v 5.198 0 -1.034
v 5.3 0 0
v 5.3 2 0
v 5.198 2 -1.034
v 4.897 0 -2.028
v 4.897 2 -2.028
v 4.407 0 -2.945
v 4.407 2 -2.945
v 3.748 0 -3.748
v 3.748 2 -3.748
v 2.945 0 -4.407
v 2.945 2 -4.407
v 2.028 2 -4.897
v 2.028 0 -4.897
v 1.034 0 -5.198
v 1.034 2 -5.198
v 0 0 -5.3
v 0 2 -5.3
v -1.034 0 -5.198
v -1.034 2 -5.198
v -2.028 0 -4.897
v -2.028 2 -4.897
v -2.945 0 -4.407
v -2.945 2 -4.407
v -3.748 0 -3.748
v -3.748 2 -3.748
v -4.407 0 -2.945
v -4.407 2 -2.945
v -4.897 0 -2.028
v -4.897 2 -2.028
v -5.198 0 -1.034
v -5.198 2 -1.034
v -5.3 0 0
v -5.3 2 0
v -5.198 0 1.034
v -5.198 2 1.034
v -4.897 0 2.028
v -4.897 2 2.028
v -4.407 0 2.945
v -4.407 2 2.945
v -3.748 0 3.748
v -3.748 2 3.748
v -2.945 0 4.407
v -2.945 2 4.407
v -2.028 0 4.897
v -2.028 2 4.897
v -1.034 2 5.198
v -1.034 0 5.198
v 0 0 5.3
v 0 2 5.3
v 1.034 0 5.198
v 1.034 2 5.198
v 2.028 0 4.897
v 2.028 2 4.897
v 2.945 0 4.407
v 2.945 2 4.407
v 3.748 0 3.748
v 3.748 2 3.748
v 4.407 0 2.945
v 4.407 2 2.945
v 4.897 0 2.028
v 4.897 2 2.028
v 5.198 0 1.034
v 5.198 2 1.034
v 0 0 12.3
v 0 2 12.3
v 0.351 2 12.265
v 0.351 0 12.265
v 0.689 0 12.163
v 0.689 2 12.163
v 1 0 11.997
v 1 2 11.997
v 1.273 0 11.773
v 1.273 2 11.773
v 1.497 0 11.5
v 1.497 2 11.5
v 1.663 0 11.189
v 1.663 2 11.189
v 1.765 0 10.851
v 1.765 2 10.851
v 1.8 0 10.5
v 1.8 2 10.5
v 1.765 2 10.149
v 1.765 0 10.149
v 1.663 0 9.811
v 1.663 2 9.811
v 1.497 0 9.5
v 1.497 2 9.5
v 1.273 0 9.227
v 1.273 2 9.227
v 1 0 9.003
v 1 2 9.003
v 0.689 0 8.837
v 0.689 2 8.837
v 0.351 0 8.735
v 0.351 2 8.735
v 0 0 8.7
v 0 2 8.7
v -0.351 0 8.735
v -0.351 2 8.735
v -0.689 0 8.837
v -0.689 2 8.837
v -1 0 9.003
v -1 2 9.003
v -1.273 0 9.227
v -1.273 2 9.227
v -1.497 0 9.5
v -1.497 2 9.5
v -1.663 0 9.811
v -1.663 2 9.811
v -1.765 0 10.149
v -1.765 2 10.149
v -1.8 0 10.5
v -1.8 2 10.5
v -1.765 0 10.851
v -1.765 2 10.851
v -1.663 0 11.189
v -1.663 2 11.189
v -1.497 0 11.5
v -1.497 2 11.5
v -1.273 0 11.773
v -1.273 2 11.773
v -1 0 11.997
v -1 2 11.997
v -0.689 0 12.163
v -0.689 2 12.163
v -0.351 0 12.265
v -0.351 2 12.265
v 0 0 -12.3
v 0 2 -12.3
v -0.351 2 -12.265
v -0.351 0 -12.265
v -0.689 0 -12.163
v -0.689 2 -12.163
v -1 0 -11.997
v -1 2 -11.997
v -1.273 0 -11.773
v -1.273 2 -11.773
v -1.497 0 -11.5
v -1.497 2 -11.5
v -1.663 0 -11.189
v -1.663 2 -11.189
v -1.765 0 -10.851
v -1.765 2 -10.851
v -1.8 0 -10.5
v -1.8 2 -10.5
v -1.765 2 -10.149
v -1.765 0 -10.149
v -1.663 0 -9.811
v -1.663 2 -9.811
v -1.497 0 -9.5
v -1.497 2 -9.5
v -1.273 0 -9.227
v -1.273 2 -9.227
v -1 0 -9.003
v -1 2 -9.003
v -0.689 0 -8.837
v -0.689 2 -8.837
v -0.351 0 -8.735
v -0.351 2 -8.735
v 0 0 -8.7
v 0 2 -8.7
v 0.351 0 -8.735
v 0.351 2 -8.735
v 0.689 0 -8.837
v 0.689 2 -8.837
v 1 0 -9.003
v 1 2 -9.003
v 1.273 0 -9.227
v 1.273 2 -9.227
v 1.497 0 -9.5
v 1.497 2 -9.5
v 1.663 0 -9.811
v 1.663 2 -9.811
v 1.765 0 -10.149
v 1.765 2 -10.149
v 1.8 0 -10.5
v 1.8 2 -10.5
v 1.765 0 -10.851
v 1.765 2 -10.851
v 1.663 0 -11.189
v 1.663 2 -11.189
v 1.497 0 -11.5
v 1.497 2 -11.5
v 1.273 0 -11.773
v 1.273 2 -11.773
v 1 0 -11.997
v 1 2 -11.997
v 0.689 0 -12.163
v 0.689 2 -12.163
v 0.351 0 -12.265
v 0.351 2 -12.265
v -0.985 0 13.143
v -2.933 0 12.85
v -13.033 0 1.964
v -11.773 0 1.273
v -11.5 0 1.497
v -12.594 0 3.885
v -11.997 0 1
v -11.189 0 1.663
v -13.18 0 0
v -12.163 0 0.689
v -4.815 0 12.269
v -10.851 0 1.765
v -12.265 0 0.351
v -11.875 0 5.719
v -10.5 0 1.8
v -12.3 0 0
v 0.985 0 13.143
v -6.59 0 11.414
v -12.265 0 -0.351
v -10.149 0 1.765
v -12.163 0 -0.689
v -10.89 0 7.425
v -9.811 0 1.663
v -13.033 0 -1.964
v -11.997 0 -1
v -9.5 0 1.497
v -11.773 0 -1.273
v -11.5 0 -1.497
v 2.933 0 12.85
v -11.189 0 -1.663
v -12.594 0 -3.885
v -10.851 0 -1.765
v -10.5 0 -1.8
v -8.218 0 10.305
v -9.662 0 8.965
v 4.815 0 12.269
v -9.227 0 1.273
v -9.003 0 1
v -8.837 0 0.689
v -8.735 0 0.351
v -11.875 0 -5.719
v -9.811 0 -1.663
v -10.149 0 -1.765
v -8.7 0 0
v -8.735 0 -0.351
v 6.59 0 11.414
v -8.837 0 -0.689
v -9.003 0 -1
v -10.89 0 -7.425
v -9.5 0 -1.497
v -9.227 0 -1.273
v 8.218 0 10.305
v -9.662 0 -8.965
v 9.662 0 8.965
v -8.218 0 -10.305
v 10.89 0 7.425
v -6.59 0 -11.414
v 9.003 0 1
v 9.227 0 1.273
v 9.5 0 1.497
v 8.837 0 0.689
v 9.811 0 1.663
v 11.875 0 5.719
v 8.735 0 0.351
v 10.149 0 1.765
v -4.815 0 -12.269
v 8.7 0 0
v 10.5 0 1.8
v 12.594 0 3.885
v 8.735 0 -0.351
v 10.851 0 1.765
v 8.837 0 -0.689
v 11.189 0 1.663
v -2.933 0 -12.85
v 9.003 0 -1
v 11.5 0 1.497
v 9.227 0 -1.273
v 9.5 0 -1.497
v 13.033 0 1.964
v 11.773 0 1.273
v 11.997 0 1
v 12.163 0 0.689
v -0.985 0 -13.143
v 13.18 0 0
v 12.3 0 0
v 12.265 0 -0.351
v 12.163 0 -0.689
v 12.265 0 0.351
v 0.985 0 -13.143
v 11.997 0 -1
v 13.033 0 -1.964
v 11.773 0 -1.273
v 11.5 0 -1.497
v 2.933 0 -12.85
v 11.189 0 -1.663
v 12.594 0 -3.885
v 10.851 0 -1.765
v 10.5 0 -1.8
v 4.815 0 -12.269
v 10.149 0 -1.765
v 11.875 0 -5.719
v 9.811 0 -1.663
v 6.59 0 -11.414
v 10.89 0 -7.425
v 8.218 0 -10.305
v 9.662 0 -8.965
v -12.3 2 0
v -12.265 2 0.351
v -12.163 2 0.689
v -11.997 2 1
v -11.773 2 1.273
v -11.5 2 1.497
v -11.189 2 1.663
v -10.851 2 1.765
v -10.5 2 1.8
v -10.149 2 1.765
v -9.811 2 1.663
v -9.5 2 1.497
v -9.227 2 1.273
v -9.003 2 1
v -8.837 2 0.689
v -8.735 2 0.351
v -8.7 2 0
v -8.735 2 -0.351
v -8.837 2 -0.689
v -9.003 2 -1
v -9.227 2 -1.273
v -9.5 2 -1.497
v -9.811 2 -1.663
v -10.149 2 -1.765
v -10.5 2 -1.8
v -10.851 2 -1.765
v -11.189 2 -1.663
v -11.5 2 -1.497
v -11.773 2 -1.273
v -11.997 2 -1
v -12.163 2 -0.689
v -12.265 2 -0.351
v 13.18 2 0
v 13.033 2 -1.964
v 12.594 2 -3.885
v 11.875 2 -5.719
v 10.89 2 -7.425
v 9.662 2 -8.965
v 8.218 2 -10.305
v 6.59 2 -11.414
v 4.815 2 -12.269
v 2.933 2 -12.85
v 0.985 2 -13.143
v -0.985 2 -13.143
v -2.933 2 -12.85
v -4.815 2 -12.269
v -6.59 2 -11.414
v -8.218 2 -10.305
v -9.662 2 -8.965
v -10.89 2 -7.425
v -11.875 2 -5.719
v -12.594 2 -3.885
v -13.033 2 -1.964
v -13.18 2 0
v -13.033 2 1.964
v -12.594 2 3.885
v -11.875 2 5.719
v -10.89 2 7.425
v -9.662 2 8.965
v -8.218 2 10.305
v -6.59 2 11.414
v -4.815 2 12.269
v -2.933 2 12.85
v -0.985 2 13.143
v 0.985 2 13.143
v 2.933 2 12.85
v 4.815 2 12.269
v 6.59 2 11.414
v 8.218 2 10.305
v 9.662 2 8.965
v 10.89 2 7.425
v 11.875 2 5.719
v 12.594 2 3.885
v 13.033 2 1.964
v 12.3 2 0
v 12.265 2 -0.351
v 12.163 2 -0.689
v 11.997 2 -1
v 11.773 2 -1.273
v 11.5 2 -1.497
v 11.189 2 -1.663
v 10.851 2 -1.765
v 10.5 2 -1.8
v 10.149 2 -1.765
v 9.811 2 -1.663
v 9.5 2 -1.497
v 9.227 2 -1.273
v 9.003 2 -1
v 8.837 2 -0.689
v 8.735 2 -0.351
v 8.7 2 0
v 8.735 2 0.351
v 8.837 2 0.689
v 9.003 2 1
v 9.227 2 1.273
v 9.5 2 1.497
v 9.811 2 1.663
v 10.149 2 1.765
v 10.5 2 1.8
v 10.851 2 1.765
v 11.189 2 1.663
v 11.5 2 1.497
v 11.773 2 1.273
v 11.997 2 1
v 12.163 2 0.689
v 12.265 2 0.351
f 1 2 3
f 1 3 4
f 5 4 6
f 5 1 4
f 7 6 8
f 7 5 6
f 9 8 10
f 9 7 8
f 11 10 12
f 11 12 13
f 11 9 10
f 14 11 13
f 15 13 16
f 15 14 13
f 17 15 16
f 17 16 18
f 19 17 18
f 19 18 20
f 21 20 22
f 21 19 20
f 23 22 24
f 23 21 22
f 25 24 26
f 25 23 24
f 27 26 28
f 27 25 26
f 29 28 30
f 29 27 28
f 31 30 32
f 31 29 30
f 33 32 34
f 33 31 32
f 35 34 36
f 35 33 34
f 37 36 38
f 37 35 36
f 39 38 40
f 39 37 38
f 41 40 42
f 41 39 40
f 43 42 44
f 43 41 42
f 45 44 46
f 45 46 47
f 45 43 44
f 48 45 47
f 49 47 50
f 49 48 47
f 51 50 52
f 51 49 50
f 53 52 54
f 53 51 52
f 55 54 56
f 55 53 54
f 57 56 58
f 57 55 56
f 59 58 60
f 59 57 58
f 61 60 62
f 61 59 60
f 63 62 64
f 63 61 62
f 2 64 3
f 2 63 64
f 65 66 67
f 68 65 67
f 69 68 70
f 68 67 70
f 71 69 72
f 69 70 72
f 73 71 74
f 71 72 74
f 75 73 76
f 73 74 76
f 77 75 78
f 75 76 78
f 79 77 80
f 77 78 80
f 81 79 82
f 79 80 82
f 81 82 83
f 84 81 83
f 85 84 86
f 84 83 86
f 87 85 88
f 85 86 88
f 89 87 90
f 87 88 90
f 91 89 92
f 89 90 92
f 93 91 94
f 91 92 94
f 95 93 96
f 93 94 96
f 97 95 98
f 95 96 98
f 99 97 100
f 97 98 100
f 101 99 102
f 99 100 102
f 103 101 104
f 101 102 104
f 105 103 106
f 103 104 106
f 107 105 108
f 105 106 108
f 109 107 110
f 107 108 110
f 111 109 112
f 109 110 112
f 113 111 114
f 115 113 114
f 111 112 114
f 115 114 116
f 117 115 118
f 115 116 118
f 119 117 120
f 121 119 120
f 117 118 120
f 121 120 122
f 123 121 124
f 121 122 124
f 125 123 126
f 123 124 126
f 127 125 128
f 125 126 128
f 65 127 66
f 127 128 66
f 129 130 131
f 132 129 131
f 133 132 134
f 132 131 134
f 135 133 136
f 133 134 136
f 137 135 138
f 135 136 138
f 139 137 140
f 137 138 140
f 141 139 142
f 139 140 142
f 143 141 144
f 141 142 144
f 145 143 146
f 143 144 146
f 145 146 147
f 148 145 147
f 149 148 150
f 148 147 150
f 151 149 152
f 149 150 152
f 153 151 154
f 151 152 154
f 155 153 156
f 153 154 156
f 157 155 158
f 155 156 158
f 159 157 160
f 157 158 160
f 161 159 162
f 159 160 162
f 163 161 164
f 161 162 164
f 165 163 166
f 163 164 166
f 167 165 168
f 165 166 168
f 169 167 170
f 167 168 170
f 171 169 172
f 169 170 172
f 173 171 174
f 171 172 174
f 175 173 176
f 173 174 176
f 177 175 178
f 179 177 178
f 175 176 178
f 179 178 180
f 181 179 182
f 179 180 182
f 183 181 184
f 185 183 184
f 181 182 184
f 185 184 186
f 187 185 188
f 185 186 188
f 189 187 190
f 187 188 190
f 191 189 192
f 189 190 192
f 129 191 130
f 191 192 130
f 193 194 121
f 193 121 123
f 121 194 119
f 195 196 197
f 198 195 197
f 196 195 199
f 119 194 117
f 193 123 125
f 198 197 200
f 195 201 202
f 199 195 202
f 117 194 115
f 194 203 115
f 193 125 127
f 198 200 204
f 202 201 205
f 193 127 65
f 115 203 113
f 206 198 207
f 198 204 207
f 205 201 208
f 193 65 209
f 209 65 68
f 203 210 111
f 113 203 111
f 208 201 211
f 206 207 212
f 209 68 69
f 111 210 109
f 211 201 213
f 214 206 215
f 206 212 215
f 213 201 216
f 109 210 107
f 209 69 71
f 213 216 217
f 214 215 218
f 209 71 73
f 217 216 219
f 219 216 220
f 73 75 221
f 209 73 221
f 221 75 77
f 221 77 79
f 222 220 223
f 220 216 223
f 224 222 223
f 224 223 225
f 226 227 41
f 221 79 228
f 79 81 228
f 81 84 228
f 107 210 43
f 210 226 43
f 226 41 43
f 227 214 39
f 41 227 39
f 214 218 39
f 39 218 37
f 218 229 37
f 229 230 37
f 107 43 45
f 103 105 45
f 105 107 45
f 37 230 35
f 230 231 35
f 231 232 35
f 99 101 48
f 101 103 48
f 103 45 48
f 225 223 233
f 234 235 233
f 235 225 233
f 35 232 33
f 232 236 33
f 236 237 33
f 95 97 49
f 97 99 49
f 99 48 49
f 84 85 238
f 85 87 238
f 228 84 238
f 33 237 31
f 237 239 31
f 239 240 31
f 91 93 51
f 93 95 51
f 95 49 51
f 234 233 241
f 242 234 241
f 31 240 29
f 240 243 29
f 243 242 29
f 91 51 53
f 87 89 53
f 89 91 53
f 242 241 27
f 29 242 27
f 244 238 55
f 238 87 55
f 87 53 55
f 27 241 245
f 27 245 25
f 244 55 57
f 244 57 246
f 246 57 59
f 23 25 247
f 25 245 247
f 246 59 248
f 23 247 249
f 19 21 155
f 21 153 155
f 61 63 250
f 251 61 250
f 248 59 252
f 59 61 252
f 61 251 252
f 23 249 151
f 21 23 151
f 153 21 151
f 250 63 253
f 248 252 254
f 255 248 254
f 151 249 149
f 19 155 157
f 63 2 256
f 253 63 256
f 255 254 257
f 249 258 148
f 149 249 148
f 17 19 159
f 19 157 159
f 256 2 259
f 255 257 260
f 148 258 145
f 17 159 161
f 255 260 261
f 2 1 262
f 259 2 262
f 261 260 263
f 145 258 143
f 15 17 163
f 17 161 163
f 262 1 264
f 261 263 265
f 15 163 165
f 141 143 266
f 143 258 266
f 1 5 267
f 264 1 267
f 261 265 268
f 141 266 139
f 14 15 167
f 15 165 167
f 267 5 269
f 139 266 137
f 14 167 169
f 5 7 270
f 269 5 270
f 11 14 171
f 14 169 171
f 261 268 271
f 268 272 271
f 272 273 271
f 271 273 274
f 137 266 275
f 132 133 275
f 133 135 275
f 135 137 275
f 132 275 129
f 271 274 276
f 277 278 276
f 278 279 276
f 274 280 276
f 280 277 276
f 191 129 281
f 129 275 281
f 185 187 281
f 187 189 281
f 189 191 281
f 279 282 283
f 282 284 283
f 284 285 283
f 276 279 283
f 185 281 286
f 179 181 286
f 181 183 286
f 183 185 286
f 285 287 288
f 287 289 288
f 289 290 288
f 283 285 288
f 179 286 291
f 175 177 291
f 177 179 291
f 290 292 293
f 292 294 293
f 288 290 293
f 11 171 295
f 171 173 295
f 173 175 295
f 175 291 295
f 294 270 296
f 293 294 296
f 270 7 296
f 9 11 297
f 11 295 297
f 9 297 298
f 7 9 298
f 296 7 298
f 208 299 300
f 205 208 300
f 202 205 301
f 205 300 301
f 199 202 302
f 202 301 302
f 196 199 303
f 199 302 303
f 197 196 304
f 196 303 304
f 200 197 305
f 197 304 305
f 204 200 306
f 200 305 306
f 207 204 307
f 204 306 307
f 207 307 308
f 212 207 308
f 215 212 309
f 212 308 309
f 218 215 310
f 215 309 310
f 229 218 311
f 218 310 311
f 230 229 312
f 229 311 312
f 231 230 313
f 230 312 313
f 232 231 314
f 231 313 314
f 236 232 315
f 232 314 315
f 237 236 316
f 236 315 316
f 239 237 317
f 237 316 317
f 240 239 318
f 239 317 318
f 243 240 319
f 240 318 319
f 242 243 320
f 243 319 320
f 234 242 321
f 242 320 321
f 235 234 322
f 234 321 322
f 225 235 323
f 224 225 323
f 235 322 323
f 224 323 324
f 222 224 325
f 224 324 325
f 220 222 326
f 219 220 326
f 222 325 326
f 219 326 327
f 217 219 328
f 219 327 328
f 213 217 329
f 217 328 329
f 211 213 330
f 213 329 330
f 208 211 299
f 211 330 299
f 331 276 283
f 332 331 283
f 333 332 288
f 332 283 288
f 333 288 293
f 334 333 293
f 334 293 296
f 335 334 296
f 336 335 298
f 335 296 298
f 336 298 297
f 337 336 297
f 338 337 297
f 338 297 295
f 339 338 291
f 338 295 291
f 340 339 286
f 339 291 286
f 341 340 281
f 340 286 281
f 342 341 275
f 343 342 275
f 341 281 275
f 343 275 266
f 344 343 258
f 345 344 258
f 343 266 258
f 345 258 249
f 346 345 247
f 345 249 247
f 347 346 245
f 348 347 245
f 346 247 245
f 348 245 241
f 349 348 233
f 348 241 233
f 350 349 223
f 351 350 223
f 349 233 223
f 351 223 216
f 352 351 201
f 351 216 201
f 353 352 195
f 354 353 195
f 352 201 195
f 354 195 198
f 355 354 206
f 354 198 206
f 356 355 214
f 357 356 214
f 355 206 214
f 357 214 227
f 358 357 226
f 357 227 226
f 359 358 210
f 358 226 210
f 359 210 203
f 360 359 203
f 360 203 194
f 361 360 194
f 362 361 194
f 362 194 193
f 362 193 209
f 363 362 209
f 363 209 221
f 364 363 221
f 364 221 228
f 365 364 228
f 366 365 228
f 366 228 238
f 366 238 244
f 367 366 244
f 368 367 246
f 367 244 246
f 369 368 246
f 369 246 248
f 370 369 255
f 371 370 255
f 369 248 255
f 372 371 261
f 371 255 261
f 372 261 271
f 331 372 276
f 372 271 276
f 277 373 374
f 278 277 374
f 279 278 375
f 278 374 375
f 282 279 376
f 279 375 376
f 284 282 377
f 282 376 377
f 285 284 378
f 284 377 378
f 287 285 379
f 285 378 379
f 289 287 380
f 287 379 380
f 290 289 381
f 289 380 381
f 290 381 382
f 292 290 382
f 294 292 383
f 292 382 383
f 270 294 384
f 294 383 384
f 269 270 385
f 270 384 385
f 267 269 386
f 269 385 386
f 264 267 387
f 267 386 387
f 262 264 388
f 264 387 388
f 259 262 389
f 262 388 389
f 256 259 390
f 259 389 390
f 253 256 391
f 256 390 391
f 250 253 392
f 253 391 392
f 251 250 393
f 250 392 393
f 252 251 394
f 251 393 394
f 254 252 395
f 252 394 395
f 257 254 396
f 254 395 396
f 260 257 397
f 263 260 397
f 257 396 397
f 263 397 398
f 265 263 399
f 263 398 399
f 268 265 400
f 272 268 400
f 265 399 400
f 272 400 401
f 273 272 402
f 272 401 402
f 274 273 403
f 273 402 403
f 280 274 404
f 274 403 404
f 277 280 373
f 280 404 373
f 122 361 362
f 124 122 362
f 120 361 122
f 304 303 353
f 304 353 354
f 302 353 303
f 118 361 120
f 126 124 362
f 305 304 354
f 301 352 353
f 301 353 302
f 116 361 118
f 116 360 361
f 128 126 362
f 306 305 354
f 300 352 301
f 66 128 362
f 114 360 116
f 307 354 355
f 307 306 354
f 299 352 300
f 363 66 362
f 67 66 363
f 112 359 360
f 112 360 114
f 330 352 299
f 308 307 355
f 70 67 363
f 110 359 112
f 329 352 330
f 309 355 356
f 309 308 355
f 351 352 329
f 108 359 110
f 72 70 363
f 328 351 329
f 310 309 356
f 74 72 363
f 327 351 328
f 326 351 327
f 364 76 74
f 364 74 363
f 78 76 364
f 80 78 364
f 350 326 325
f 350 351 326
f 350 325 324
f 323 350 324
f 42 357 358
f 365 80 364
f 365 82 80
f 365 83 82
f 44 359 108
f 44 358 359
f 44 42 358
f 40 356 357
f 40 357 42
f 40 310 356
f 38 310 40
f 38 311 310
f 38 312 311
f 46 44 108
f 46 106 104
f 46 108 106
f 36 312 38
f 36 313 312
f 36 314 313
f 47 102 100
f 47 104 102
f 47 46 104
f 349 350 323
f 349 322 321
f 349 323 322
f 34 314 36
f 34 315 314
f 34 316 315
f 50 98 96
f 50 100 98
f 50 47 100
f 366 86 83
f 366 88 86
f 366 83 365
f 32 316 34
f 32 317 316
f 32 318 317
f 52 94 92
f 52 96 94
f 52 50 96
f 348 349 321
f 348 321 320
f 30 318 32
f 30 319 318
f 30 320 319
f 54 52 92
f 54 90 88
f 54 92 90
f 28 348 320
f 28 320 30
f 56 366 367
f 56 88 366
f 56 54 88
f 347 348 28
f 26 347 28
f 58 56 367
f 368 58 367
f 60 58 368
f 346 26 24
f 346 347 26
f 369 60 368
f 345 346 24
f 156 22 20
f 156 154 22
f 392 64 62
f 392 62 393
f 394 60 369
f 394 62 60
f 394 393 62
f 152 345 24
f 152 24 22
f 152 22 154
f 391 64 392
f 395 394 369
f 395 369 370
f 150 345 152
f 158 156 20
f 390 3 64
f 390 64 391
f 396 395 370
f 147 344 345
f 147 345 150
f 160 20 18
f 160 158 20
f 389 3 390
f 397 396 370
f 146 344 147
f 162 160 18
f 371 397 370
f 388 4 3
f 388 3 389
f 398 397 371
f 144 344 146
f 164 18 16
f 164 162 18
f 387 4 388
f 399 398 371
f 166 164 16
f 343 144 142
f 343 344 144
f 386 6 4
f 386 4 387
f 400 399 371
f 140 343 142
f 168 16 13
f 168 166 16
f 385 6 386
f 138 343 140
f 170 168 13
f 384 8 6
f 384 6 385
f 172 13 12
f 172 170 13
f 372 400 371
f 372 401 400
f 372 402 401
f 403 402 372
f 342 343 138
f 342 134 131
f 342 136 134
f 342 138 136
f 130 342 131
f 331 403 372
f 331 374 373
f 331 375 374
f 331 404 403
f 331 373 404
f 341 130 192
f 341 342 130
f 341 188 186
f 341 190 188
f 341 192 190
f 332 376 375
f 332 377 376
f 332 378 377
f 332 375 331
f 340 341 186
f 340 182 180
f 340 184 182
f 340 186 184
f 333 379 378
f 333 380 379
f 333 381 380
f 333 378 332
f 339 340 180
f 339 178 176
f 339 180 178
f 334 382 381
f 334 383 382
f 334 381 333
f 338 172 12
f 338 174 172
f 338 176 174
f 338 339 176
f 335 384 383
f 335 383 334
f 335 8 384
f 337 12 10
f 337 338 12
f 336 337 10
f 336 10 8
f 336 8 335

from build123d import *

# Parameters (mm, degrees)
CROQUIS1_R              = 13.18
CROQUIS1_R_2            = 5.3
SALIENTE_EXTRUIR1_DEPTH = 2
CROQUIS2_R              = 1.8
CORTAR_EXTRUIR1_DEPTH   = 2
MATRIZC1_COUNT          = 4


with BuildPart() as part:
    # Croquis1 → Saliente-Extruir1 (new body)
    with BuildSketch(Plane(origin=(0, 0, 0), x_dir=(1, 0, 0), z_dir=(0, 1, 0))):
        Circle(CROQUIS1_R)
        Circle(CROQUIS1_R_2, mode=Mode.SUBTRACT)
    extrude(amount=SALIENTE_EXTRUIR1_DEPTH)

    # Croquis2 → Cortar-Extruir1 (cut)
    with BuildSketch(Plane(origin=(0, 2, 0), x_dir=(1, 0, 0), z_dir=(0, 1, 0))):
        with Locations((10.5, 0)):
            Circle(CROQUIS2_R)
    cortar_extruir1 = extrude(amount=-CORTAR_EXTRUIR1_DEPTH, mode=Mode.SUBTRACT)

    # MatrizC1: Cortar-Extruir1 ×4 about axis
    matrizc1_axis = Axis((0, 0, 0), (0, 1, 0))
    for i in range(1, MATRIZC1_COUNT):
        add(cortar_extruir1.rotate(matrizc1_axis, i * 360 / MATRIZC1_COUNT), mode=Mode.SUBTRACT)


solid = part.part
